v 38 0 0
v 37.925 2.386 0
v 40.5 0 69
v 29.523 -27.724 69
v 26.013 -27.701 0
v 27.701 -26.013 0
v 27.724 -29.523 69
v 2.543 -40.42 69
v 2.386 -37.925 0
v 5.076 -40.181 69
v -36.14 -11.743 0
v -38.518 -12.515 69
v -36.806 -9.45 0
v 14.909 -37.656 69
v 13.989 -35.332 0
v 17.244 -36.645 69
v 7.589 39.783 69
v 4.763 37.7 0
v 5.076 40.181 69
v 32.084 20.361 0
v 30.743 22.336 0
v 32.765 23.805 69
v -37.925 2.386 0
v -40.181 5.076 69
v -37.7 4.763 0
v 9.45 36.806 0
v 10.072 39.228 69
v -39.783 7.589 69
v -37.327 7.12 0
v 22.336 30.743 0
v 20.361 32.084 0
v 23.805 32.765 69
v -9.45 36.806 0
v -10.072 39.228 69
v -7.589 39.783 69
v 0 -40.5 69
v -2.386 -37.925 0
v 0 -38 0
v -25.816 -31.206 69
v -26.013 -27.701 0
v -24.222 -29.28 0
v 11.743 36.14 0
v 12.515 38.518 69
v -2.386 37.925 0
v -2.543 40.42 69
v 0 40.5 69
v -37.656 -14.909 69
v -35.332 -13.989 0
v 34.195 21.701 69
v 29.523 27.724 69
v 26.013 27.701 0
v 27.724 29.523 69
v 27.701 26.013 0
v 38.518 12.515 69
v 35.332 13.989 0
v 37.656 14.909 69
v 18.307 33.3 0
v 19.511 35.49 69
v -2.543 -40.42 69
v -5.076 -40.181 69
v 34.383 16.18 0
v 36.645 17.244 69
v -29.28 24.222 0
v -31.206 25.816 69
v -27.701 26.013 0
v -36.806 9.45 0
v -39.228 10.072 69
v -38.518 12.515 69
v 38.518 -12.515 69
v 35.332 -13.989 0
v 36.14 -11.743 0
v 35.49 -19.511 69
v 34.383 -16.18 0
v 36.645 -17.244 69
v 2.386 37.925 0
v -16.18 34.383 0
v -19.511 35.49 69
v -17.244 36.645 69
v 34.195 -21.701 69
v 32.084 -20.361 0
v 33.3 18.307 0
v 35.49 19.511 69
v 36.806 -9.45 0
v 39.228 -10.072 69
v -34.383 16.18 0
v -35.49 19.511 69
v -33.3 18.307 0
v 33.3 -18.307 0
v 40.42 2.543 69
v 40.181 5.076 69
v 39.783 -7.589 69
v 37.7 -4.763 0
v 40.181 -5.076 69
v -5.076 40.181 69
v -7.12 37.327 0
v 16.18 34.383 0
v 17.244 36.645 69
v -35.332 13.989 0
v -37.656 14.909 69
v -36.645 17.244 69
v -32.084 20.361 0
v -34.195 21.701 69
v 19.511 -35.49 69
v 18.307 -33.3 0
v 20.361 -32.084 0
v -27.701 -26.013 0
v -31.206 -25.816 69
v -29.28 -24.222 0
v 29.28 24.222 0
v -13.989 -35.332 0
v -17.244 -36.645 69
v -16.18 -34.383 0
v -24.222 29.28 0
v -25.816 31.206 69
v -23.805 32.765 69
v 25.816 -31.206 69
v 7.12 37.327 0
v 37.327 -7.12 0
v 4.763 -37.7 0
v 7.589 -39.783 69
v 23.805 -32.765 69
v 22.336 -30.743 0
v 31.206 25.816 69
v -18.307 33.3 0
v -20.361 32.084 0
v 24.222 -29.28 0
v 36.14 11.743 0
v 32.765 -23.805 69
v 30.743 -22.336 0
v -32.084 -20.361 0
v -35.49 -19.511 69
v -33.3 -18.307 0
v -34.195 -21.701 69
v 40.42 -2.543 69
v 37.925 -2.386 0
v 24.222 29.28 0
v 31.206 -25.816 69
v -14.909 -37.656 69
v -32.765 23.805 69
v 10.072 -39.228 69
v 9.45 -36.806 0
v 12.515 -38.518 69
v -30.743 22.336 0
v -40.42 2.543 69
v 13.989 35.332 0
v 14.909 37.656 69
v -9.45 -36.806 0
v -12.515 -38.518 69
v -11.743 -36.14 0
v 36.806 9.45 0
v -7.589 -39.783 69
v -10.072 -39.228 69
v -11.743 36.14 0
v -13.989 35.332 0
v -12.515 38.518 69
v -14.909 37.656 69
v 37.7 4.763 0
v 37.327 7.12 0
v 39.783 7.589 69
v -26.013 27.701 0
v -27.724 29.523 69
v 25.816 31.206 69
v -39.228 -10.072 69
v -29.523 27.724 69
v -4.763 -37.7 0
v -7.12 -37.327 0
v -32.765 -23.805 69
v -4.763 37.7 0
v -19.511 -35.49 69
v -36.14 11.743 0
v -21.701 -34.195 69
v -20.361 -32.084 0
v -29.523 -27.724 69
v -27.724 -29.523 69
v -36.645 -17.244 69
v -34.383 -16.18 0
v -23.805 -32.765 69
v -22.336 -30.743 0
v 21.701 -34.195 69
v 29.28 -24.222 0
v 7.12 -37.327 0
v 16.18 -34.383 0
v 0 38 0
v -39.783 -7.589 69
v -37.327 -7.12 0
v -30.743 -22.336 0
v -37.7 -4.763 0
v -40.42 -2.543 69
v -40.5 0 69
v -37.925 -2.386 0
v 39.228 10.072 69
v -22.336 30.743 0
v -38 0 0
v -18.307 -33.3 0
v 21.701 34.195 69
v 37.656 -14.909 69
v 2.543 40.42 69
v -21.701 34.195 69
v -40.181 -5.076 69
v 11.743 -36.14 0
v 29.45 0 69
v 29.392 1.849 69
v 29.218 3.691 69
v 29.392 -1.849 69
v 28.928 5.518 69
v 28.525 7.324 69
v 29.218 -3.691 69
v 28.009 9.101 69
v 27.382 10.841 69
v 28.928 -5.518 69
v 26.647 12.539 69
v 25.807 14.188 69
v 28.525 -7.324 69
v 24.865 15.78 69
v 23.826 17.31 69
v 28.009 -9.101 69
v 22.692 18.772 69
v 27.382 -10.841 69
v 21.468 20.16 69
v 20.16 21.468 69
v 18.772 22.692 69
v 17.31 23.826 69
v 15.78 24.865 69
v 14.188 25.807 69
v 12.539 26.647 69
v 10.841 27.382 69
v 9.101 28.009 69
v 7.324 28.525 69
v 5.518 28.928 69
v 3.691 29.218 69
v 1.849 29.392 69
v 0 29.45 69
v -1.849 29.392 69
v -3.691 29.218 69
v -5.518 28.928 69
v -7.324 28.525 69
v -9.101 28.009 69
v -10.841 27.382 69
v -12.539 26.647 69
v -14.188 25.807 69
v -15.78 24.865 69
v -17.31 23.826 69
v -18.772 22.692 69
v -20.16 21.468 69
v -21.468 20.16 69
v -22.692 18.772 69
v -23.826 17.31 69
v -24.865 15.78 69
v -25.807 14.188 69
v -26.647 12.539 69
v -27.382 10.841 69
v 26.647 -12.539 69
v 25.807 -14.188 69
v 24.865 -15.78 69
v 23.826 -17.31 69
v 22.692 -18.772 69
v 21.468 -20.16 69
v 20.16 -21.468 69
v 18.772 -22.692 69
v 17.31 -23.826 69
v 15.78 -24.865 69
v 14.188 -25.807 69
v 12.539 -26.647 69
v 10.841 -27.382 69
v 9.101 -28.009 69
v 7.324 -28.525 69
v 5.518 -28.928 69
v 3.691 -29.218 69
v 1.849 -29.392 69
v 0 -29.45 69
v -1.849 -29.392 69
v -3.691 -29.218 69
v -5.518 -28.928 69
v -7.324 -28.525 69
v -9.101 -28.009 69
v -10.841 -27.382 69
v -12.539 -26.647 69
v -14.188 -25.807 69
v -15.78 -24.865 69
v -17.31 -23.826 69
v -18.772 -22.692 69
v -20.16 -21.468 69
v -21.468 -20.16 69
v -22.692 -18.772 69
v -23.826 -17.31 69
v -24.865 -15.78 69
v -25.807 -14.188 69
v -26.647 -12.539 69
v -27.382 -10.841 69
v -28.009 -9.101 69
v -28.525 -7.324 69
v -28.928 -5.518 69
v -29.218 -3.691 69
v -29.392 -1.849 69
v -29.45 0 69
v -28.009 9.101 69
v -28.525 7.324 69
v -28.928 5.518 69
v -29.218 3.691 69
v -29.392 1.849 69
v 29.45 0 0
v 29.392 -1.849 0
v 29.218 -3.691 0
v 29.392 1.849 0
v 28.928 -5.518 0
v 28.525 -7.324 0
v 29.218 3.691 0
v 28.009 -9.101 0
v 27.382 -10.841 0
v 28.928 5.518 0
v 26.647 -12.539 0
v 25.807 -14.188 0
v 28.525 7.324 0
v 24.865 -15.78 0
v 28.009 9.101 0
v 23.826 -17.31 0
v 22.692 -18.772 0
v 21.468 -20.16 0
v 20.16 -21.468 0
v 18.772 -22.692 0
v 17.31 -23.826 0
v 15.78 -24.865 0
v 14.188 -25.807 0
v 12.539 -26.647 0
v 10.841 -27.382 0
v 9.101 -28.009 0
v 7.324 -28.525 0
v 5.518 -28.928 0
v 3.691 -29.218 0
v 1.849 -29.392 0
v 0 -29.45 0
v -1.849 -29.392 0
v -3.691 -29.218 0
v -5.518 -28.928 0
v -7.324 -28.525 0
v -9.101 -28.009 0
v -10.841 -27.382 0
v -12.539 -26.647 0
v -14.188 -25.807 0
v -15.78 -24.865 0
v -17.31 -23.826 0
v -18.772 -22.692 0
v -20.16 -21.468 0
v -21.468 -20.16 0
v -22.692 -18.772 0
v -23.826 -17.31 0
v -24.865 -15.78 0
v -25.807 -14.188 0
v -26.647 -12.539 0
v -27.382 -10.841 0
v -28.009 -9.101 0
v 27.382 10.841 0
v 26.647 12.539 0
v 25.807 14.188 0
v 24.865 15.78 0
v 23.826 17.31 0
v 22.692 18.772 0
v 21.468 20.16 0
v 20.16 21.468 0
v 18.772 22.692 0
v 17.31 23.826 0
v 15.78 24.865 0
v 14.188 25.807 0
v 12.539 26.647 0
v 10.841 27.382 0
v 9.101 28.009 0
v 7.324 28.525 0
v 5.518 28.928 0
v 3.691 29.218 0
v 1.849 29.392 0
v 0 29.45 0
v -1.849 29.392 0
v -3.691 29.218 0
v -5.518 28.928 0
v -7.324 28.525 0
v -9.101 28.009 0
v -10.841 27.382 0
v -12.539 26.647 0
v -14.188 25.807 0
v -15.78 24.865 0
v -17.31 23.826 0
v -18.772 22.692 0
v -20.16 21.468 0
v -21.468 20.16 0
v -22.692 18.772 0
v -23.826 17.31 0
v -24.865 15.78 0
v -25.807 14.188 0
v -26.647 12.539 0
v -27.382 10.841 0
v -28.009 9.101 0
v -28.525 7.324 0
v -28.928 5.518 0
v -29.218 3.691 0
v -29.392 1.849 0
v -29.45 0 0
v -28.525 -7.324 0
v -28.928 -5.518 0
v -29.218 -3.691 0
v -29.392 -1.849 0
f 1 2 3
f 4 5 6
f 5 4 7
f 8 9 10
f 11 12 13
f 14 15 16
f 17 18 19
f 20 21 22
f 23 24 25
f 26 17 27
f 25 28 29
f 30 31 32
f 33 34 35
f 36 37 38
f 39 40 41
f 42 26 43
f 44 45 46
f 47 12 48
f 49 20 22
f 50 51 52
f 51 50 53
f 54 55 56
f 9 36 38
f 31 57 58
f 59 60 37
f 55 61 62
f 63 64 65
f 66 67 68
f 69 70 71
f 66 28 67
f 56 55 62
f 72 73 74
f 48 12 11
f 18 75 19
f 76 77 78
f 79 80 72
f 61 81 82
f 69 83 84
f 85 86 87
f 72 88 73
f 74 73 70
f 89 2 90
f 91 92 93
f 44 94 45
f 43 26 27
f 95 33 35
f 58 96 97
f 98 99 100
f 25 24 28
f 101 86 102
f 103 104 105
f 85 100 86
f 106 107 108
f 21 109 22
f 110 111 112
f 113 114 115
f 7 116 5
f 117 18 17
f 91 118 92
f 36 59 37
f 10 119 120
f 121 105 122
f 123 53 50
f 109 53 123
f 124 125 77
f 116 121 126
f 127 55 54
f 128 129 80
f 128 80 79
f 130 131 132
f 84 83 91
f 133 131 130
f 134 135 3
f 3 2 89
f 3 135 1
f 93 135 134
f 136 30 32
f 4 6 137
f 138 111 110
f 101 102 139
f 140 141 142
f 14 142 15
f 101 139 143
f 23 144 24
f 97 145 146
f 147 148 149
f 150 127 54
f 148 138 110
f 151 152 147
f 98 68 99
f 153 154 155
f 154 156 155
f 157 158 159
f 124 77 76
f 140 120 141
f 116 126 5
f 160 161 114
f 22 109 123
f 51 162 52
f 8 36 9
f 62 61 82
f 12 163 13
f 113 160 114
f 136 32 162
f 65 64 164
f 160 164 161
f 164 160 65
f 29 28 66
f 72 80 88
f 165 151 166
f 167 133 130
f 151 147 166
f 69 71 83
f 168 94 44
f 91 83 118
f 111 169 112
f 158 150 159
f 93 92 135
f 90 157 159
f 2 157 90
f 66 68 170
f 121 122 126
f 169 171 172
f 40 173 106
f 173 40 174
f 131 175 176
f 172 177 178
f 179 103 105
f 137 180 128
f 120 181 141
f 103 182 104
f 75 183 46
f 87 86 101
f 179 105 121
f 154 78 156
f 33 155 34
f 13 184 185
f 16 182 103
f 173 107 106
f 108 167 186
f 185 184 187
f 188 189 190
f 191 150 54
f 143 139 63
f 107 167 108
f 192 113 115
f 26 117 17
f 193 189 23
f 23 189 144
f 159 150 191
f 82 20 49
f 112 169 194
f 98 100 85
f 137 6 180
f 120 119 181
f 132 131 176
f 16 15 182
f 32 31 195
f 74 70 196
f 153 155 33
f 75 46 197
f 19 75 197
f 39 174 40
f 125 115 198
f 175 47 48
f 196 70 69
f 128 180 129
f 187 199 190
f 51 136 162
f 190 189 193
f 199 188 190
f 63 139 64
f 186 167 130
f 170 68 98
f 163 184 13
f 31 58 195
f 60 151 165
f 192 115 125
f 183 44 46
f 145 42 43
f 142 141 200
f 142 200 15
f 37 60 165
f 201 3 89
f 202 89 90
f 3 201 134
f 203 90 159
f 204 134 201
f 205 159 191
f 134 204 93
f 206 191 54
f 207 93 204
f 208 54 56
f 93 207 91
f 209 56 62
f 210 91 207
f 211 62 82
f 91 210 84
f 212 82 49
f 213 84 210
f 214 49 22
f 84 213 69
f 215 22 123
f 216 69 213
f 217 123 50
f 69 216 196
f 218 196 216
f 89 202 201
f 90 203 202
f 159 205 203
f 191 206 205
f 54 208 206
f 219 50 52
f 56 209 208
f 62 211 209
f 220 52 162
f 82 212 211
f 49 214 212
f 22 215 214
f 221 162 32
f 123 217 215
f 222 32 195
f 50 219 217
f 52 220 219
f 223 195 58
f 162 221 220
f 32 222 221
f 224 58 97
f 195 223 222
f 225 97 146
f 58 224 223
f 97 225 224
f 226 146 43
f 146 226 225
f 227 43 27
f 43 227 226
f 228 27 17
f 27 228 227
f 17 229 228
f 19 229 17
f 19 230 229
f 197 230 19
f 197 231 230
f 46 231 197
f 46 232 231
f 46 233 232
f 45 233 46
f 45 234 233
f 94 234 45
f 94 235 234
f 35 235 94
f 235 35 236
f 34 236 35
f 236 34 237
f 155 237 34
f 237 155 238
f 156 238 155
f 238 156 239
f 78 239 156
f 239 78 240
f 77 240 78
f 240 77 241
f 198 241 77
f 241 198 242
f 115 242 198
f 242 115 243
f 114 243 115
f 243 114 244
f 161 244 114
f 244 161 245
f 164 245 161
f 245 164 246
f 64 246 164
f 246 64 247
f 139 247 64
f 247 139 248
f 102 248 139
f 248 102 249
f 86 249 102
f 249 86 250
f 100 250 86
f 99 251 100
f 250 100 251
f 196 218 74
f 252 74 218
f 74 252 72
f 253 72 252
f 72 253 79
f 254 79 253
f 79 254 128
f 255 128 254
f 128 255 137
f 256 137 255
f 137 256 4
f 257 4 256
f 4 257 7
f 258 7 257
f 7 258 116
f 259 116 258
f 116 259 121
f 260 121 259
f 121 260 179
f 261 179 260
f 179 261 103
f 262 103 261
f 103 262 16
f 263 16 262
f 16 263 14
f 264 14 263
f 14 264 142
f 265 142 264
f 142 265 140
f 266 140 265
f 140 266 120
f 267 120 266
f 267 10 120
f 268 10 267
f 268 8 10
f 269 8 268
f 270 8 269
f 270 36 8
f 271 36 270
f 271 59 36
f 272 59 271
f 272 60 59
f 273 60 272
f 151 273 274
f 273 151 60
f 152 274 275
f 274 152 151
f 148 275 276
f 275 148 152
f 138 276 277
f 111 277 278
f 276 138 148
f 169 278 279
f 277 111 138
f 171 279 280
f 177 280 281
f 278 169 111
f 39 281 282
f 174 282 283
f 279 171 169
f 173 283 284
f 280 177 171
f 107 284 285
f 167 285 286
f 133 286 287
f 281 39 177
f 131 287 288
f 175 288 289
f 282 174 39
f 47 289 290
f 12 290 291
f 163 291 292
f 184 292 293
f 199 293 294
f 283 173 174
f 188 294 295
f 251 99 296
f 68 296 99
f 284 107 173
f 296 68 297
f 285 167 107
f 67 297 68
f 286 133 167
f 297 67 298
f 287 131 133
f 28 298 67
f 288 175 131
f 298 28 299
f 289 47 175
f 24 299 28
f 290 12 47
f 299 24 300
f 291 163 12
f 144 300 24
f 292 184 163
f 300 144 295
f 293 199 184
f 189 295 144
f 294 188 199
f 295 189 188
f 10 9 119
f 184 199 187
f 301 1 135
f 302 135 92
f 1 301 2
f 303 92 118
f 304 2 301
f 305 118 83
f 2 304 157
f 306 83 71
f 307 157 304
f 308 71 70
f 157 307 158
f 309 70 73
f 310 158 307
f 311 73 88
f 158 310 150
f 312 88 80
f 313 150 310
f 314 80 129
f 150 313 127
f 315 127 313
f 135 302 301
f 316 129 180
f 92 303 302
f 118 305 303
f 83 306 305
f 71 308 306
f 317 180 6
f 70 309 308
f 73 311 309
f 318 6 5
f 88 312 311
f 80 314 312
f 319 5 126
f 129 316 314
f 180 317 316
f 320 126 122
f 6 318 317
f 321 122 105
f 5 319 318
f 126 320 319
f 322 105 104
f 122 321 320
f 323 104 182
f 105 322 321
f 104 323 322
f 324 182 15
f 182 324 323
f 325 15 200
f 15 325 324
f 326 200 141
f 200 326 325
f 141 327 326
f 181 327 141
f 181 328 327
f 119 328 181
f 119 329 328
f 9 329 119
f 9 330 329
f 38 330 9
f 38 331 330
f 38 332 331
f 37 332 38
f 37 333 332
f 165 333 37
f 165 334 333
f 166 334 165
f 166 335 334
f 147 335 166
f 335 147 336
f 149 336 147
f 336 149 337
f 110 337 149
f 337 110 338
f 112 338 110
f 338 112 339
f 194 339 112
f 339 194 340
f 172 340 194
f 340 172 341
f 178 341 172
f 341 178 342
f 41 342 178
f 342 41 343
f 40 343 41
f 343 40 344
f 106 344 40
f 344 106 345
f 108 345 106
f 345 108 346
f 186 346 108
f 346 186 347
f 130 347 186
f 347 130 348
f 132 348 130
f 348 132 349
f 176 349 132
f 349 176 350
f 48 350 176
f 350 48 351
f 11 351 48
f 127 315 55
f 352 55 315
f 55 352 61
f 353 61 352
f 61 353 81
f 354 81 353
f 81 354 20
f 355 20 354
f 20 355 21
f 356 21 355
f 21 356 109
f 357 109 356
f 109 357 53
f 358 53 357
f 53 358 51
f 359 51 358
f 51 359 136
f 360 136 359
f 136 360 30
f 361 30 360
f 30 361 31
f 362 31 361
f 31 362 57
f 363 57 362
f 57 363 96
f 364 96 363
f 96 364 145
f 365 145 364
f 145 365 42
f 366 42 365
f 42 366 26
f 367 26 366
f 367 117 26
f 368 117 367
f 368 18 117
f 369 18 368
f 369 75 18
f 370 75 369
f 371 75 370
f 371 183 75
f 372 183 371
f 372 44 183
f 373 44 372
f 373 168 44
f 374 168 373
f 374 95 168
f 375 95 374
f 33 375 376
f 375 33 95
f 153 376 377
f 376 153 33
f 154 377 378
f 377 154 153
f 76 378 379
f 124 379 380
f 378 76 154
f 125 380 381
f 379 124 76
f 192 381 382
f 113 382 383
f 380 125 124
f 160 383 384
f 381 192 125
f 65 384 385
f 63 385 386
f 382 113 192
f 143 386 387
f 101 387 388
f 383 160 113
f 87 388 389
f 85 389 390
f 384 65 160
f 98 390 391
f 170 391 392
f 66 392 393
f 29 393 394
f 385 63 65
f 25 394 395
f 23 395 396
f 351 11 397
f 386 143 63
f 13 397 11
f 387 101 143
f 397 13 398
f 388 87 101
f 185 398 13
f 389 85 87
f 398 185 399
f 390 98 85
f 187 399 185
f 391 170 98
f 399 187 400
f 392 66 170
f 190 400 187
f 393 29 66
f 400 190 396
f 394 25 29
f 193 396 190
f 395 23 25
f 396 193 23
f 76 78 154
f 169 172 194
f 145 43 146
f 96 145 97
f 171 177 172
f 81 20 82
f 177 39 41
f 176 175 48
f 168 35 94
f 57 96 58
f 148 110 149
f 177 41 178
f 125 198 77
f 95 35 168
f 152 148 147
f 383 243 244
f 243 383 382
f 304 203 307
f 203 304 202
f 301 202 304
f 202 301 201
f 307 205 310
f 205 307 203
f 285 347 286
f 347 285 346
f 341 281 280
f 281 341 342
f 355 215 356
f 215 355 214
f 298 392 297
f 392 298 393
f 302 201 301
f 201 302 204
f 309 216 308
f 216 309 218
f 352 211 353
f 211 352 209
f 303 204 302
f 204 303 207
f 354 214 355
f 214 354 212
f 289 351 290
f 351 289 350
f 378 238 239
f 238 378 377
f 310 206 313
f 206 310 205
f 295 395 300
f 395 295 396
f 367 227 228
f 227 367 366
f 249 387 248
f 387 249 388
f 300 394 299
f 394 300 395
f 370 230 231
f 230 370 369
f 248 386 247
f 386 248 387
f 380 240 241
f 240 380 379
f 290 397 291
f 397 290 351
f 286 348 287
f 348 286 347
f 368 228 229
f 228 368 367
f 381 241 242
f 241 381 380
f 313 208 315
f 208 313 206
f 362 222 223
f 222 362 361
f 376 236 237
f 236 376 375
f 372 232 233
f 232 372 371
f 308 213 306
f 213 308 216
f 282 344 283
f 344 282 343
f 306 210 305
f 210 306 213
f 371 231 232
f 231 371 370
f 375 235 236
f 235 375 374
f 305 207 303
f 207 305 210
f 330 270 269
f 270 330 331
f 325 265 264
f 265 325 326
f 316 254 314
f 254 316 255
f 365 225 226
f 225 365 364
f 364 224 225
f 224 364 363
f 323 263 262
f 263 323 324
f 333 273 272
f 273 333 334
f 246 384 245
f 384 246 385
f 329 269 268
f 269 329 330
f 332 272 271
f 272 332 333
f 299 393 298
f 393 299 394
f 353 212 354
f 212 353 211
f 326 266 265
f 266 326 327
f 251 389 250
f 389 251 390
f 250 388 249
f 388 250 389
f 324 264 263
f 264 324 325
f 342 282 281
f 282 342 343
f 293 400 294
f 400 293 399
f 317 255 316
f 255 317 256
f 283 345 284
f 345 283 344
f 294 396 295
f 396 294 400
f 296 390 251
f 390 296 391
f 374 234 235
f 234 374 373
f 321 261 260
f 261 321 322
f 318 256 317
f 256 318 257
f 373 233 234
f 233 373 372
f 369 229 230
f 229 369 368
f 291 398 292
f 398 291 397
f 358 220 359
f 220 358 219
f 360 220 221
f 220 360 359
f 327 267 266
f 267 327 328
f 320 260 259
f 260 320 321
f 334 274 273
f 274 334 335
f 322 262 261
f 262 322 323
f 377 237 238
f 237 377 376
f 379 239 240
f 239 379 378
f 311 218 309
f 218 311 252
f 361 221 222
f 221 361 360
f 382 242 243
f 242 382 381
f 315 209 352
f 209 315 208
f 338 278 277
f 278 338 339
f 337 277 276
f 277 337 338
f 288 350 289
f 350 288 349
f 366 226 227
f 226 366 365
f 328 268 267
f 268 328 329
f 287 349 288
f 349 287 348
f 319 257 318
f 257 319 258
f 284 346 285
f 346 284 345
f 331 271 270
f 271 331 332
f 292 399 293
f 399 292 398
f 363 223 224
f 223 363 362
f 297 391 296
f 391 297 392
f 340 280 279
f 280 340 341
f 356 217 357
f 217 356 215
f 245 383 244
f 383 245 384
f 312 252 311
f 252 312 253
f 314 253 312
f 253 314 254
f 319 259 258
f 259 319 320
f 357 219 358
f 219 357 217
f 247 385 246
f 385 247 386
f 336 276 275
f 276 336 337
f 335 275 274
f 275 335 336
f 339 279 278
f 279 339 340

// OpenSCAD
// file: support/vars.scad
// Used to merge objects on the same coord
rerr = 0.01;
rerr2 = rerr*2;

// Typically recommended to use nozzle size as tolerance to get two pieces to fit together tightly
tolerances = [
  ["perfect",  0.1],
  ["precise",  0.2],
  ["tight",    0.3],
  ["friction", 0.4],
  ["loose",    0.5],
  ["near",     0.6],
];
function tolerance(key) = tolerances[search([key], tolerances)[0]][1];

wall_sizes = [
  ["paper",    1],
  ["flimsy",   2],
  ["weak",     3],
  ["strong",   4],
  ["stronger", 5],
  ["solid",    6],
];
function wall_size(key) = wall_sizes[search([key], wall_sizes)[0]][1];

// Defaults (Can be overridden)
wall = wall_size("flimsy");
tol = tolerance("loose");
// main file
include <support/vars.scad>

holder_top = 82; // 82.1
holder_bot = 77;
can = 57.7;
height = 69;

$fn = 100;

difference() {
  cylinder(height, holder_bot/2 - tolerance("loose"), holder_top/2 - tolerance("loose"), center=false);
  translate([0, 0, -rerr])
  cylinder(r=can/2 + tolerance("near"), h=height+rerr2, center=false);
}
